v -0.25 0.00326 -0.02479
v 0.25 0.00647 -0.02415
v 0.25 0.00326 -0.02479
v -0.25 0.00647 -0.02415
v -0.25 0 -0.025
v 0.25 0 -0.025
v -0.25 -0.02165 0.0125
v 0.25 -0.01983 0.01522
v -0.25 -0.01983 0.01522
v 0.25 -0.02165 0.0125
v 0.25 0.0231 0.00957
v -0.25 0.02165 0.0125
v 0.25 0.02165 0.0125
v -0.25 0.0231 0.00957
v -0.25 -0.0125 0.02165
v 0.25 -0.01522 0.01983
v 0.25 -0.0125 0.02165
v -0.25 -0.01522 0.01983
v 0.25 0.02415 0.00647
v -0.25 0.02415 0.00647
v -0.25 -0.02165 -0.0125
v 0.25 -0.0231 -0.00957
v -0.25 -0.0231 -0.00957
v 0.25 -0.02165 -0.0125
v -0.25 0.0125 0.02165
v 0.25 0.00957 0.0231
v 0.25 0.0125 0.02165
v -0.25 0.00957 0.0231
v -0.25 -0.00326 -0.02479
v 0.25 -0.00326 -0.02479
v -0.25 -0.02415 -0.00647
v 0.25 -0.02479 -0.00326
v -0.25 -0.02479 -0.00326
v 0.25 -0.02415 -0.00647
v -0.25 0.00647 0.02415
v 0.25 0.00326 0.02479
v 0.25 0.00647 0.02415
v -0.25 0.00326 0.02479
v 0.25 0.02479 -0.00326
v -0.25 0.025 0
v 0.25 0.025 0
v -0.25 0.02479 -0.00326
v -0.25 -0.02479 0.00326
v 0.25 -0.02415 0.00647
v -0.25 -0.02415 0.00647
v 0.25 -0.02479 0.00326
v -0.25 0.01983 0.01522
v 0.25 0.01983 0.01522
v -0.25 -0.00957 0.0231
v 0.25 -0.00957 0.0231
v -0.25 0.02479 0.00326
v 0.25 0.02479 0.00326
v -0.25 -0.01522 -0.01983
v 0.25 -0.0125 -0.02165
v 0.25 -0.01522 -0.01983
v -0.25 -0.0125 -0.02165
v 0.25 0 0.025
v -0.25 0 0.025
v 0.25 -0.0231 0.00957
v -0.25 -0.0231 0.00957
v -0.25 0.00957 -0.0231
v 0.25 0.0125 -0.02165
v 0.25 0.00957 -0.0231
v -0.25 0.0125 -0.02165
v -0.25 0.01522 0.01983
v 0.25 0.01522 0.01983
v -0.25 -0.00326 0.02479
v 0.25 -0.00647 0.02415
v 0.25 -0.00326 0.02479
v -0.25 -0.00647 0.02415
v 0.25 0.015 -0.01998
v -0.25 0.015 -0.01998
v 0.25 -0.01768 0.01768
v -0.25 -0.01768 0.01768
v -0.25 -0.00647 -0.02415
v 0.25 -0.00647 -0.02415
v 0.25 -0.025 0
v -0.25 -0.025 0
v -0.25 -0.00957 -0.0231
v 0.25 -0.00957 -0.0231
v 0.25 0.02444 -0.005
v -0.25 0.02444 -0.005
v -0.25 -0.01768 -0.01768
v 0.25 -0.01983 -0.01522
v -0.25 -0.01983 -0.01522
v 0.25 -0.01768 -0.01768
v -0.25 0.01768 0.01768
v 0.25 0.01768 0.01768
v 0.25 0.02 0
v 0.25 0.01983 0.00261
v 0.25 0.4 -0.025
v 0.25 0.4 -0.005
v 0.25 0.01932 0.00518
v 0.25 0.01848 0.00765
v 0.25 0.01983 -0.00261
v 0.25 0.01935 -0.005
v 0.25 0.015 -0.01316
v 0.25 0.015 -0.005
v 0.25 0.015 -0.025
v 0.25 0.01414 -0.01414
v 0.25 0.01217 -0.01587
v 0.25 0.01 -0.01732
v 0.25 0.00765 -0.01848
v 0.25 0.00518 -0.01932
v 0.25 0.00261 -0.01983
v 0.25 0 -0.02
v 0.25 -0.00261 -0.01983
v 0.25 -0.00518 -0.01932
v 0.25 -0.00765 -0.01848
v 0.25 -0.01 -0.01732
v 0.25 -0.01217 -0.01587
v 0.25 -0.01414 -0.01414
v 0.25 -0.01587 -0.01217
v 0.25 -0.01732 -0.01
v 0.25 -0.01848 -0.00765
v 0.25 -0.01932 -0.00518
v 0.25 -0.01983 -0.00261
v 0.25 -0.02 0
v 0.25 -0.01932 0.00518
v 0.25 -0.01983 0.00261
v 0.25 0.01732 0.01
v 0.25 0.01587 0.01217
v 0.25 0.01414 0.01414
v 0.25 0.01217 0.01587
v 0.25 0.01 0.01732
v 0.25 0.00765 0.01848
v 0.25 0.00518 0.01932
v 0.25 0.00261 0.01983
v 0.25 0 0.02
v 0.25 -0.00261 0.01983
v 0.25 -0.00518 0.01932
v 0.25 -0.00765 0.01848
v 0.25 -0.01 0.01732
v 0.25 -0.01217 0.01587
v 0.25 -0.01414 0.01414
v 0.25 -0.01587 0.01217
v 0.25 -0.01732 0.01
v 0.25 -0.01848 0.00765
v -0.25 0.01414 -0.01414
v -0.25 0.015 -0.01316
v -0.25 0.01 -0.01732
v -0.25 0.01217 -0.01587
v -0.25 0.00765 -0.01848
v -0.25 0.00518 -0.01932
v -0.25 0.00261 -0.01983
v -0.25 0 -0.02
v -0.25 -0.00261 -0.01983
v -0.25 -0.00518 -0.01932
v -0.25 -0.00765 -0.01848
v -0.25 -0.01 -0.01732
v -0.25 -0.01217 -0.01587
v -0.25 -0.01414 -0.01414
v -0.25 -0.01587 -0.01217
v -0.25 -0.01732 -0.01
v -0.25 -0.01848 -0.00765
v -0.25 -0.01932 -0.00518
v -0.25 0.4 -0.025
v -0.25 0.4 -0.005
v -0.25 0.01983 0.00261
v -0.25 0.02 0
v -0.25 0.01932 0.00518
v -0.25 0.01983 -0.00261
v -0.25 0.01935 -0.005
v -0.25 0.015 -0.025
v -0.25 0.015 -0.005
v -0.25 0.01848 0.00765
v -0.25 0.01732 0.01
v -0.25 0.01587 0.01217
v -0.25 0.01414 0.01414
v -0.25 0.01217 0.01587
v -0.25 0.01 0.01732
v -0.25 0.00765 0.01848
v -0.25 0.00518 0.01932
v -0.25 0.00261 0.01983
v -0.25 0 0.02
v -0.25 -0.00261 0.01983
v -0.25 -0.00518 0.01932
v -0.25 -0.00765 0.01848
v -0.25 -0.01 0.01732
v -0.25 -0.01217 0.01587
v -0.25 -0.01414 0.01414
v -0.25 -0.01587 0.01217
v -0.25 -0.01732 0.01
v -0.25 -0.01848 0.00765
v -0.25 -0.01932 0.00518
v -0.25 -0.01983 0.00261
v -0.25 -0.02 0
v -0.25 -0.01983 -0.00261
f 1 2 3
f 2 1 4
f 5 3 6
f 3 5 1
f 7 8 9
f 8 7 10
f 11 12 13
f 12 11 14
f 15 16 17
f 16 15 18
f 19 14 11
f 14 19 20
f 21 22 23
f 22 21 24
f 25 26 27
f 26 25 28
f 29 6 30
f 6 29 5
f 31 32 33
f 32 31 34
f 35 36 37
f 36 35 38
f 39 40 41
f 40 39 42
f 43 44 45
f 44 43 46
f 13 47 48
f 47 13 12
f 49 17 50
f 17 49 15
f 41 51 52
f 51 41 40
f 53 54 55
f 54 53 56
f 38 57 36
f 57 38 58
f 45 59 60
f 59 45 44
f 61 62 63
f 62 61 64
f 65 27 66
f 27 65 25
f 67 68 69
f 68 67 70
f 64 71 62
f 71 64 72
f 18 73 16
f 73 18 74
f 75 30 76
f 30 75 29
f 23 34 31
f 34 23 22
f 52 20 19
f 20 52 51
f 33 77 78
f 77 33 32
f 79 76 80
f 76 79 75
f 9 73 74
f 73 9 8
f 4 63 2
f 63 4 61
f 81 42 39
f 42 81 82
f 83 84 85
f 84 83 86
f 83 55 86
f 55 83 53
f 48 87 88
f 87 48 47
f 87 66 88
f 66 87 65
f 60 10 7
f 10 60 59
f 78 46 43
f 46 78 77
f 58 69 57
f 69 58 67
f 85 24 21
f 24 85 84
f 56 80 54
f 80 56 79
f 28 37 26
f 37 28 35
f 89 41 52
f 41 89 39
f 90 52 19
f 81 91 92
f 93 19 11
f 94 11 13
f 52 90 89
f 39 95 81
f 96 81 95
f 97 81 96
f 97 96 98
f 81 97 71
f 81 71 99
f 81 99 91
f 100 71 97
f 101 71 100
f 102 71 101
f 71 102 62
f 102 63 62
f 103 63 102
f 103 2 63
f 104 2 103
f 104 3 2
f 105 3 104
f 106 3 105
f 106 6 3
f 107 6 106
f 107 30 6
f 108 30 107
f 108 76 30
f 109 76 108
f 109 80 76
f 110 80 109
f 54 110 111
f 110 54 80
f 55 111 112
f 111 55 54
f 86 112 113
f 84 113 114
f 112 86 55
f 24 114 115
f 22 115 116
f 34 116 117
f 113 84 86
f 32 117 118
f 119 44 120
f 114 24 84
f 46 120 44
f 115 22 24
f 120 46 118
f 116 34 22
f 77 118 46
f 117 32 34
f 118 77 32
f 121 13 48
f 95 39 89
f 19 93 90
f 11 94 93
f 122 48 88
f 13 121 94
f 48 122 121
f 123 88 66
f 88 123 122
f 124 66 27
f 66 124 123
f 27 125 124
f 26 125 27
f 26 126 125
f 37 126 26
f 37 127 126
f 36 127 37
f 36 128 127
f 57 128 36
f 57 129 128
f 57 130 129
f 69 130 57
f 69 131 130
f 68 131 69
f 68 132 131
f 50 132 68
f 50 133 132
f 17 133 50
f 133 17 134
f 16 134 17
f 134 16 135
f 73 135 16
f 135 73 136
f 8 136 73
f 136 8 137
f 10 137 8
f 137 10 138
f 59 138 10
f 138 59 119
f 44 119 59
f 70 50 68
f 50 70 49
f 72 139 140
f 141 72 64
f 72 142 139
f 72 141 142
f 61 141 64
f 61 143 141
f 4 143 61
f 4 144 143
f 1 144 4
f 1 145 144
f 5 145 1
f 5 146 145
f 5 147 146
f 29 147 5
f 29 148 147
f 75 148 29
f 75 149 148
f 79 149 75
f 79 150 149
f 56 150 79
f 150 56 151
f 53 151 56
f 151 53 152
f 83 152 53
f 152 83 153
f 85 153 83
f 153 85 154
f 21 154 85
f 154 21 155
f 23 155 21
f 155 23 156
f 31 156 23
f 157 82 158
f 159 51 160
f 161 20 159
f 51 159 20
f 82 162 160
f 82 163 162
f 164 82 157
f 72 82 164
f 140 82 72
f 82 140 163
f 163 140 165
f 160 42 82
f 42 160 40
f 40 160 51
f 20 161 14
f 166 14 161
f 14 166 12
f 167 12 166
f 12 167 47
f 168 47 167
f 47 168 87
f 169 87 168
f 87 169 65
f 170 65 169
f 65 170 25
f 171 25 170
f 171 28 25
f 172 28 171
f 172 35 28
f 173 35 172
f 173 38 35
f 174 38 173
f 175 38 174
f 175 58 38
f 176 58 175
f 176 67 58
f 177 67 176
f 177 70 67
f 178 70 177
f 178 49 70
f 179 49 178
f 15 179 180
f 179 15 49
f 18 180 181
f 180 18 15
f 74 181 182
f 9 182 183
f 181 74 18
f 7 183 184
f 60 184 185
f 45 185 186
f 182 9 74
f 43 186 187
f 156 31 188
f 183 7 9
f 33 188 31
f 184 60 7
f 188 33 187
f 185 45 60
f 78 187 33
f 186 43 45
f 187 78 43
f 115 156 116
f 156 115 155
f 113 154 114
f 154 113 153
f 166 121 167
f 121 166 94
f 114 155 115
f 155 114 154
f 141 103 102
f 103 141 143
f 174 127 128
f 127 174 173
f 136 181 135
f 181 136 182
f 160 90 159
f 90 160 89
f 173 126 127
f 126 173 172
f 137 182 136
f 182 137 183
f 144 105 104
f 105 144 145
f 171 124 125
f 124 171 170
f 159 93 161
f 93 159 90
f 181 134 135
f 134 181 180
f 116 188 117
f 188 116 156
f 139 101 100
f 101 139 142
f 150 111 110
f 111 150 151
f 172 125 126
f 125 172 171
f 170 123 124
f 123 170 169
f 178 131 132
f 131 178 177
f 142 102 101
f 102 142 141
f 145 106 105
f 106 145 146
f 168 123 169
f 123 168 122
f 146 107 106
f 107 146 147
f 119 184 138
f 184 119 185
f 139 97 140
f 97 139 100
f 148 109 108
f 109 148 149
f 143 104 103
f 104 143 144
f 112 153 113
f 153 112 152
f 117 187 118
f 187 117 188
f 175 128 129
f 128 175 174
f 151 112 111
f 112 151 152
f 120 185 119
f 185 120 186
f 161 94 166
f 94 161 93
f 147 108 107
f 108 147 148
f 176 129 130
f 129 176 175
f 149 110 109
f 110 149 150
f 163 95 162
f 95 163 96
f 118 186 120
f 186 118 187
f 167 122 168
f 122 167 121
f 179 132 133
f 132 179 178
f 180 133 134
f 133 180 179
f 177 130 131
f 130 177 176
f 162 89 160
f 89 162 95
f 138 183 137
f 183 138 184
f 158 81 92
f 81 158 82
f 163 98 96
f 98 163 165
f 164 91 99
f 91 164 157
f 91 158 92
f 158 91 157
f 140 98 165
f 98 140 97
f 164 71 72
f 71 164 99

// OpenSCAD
// HingeMesh.CreateLeaf / HingeMath: knuckle r=.025, pin r=.02, width=.50; depth=.40, thickness=.02 m; 48 segments. Unity Y is vertical.
$fn=48; color("#8E9296") { translate([-.25,0,0]) rotate([0,90,0]) difference(){cylinder(r=.025,h=.5); translate([0,0,-.001]) cylinder(r=.02,h=.502);} translate([-.25,.015,-.025]) cube([.5,.385,.02]); }
